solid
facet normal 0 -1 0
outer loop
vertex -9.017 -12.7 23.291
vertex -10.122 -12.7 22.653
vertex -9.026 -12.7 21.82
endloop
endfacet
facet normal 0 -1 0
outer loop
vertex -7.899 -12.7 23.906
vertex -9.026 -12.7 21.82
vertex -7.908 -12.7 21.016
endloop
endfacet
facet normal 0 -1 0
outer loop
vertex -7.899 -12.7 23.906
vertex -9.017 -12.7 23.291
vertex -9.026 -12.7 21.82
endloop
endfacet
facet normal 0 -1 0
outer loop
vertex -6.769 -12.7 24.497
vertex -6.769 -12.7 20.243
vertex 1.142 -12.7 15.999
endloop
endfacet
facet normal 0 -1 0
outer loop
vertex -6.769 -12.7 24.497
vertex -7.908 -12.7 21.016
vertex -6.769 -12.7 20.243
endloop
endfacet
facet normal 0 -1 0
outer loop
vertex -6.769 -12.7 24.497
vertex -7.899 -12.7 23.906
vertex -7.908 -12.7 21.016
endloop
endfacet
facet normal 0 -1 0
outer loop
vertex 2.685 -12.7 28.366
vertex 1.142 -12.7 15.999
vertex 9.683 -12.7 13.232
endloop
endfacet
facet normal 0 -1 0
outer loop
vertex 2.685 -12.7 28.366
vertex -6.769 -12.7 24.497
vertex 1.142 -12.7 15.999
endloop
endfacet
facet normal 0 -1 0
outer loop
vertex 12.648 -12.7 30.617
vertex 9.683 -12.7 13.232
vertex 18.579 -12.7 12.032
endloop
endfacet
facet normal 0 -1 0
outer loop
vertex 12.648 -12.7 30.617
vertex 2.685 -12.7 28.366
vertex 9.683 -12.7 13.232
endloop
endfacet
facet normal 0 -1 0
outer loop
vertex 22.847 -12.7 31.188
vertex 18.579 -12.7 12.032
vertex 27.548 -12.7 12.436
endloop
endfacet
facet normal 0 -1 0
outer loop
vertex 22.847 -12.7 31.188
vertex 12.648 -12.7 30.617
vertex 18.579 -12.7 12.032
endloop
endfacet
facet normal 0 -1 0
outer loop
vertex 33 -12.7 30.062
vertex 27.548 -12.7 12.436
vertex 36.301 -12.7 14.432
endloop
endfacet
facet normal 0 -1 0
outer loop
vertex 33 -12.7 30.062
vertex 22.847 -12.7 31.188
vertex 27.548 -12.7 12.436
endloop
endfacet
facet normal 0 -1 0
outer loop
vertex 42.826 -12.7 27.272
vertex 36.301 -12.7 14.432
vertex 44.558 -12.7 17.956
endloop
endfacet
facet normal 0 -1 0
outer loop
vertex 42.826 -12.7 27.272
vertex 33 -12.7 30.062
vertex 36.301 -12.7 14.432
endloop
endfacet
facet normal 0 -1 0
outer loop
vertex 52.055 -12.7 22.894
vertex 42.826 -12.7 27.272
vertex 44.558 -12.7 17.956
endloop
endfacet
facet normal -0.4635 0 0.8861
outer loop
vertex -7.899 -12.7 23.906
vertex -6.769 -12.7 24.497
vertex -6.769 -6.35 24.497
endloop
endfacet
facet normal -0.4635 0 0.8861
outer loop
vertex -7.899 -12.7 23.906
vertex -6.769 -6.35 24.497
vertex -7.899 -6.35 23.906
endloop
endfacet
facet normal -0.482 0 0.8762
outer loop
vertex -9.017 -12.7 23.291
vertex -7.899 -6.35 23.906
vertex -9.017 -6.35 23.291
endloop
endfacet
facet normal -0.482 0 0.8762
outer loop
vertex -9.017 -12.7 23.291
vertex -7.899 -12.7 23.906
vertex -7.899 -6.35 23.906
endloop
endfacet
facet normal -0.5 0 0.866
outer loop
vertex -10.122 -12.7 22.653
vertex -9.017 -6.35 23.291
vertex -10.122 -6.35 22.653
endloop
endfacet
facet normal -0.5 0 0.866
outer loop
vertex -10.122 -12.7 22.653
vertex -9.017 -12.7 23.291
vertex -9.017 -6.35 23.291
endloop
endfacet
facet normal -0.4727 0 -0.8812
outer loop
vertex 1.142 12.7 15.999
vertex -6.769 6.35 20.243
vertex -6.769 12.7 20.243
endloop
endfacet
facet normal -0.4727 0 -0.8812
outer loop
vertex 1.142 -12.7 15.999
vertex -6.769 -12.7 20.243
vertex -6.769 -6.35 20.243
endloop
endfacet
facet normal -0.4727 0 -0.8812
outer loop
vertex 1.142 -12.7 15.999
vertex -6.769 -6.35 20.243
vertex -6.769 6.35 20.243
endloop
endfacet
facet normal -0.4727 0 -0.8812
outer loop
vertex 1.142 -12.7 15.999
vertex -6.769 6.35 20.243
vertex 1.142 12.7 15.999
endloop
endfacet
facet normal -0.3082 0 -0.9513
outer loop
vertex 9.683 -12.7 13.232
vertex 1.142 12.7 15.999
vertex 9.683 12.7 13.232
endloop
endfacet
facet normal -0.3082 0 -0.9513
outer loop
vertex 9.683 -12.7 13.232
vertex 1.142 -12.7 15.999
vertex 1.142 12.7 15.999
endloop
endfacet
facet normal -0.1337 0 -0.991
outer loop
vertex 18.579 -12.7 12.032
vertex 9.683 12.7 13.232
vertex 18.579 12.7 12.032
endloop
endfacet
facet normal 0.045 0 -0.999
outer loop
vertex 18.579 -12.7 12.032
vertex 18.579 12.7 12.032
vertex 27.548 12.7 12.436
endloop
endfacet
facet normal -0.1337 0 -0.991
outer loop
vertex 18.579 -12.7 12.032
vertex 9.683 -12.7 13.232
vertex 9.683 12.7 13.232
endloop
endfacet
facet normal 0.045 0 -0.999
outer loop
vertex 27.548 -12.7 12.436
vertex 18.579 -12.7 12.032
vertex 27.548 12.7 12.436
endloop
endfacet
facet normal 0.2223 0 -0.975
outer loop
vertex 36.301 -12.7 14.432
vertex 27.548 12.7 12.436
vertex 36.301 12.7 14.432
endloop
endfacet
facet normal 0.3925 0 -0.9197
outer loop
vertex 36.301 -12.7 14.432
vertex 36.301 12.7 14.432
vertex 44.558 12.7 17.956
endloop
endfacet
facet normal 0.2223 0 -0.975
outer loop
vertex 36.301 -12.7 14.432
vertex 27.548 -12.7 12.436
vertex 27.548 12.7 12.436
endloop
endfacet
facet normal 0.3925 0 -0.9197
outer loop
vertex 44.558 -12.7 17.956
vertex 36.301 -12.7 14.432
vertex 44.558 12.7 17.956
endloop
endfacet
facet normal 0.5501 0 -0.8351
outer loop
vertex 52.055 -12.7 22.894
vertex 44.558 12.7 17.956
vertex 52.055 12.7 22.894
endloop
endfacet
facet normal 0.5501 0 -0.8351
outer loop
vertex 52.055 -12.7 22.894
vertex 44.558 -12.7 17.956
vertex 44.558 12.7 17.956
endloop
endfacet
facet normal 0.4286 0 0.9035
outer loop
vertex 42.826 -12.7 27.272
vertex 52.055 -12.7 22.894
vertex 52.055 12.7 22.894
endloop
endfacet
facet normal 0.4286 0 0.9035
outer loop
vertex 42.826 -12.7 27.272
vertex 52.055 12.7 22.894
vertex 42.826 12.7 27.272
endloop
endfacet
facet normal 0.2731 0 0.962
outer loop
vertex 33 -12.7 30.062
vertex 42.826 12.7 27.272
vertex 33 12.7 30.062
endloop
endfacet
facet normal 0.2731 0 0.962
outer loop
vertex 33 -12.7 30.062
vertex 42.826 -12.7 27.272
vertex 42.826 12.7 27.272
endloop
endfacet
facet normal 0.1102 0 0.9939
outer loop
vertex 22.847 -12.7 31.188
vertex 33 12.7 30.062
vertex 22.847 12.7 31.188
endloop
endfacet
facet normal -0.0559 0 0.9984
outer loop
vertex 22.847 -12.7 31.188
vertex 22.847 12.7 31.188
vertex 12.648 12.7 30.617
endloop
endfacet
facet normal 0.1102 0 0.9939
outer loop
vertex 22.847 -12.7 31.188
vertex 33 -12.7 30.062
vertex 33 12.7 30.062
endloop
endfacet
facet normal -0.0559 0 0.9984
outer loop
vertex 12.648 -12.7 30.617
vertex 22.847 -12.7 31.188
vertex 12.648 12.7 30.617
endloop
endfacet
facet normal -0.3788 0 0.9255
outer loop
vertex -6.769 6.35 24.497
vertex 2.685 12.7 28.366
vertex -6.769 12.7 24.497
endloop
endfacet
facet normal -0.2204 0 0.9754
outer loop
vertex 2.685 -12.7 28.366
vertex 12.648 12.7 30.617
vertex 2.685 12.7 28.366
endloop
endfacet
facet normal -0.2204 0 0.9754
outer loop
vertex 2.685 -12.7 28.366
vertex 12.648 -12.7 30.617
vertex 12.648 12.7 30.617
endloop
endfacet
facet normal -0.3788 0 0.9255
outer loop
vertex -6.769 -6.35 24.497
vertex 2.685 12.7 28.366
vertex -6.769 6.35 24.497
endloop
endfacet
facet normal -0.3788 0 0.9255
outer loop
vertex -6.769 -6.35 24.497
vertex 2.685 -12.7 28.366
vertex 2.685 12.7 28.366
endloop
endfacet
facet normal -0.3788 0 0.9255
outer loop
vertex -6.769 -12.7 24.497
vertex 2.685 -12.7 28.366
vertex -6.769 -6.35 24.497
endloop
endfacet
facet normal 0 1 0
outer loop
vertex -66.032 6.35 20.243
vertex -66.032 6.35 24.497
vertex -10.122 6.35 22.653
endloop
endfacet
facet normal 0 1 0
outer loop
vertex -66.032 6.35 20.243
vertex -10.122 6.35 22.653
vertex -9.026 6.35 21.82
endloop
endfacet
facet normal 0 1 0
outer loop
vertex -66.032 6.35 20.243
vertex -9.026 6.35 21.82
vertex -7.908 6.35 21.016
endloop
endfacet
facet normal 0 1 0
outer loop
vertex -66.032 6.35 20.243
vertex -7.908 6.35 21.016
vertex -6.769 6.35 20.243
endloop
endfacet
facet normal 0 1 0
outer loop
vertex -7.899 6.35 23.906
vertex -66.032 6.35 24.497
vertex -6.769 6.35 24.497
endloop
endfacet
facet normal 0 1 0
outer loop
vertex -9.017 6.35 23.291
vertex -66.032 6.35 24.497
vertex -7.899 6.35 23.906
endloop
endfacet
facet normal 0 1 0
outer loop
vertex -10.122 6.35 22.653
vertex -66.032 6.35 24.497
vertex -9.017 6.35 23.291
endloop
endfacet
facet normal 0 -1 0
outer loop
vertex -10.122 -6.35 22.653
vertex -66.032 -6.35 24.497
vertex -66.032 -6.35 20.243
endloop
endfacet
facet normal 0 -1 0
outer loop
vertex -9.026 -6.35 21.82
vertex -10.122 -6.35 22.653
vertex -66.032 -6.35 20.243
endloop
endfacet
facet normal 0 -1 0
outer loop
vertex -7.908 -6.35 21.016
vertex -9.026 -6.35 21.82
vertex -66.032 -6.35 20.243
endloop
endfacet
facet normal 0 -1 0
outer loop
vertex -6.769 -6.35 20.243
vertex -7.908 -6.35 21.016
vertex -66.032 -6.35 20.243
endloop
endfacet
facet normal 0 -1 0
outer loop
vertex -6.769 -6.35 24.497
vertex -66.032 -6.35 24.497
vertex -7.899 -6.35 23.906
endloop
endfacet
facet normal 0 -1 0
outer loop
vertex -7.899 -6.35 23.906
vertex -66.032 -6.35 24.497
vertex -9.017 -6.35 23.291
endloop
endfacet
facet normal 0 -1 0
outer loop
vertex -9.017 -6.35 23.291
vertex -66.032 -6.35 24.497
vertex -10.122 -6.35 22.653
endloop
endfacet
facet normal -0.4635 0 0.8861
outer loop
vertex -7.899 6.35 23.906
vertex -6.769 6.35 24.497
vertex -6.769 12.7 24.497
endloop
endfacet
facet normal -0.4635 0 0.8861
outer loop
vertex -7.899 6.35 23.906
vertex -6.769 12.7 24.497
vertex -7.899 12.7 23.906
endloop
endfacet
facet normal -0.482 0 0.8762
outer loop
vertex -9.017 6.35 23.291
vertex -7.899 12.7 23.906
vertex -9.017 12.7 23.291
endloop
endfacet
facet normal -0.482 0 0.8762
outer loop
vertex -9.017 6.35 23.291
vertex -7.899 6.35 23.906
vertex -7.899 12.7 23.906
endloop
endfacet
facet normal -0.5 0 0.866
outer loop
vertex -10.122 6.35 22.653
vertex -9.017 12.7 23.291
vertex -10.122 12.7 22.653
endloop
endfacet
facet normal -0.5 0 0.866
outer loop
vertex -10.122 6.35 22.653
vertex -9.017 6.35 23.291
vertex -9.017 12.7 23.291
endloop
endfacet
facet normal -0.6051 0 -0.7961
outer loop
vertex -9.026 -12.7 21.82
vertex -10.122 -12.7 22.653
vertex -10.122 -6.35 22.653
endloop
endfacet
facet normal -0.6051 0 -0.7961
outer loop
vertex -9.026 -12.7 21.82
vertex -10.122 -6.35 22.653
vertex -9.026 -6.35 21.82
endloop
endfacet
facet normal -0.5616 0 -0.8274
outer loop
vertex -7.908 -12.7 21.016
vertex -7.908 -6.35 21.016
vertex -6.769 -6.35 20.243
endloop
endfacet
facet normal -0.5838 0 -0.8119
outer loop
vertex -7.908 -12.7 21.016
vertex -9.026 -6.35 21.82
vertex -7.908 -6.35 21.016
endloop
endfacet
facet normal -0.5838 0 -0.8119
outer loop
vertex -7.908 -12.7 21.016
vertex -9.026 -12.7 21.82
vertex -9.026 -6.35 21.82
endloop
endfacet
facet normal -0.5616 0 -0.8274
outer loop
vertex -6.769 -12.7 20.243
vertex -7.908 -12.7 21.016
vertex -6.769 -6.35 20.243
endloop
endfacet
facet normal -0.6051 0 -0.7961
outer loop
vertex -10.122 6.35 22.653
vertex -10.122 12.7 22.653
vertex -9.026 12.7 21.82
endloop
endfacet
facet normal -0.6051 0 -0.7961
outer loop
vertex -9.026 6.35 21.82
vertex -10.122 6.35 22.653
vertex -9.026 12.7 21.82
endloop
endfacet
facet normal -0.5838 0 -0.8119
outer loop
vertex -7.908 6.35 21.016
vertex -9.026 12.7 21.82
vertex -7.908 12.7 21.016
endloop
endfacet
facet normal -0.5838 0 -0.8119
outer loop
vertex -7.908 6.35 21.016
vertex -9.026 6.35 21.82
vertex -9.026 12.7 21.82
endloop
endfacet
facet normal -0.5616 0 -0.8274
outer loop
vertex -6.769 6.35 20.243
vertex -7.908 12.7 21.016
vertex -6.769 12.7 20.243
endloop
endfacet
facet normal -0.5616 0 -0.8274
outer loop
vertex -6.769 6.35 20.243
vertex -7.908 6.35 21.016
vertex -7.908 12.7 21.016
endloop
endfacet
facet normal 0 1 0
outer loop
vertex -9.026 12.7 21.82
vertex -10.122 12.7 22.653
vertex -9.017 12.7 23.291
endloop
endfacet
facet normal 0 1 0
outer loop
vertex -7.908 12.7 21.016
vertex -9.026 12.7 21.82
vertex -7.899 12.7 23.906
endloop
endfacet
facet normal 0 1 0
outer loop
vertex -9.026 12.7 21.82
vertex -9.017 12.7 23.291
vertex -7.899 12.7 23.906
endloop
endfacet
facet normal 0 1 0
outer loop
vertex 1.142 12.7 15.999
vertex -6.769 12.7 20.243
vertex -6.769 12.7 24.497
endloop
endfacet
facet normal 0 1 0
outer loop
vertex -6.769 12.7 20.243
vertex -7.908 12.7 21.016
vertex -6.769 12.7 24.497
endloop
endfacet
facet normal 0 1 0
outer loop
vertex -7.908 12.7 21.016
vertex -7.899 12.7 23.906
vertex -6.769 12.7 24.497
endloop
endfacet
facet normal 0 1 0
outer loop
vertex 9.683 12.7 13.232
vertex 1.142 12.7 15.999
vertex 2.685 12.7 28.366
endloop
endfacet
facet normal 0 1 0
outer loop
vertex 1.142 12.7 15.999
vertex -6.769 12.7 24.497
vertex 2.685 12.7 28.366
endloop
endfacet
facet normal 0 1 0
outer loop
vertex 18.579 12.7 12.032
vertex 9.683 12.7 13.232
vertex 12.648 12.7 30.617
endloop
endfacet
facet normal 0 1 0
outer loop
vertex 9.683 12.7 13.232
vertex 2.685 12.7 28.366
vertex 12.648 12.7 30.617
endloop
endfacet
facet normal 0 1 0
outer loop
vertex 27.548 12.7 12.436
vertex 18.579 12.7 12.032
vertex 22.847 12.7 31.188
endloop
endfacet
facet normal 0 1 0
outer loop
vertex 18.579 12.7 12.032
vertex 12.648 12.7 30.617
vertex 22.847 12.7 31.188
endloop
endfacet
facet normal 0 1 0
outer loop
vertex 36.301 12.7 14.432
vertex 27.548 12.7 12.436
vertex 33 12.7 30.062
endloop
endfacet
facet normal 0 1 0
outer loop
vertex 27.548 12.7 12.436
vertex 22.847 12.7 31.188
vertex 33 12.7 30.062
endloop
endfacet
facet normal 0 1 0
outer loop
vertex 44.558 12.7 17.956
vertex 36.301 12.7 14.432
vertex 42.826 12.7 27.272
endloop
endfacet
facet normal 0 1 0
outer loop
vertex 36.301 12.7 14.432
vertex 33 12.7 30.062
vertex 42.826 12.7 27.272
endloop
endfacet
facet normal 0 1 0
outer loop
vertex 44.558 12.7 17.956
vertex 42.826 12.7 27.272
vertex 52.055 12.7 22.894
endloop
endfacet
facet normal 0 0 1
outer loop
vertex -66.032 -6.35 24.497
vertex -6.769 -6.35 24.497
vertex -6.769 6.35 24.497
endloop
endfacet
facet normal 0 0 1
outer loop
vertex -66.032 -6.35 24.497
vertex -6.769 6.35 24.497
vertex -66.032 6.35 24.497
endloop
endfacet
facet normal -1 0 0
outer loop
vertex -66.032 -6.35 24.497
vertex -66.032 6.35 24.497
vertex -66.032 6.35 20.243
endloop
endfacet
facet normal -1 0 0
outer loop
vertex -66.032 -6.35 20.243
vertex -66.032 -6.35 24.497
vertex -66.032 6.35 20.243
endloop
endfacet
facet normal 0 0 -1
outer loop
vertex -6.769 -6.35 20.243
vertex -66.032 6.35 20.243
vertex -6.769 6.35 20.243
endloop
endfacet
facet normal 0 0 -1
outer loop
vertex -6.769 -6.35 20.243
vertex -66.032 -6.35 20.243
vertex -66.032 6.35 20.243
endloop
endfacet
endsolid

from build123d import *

# Parameters (mm, degrees)
F1_DEPTH = 12.7
F2_DEPTH = 6.35


with BuildPart() as f1:
    # F0 (on Front) → F1 (new body, symmetric)
    with BuildSketch(Plane.XZ):
        with BuildLine():
            ThreePointArc((-6.7687, 20.243496), (23.072752, 12.032943), (52.054703, 22.894429))
            ThreePointArc((52.054703, 22.894429), (22.847112, 31.187553), (-6.7687, 24.497039))
            ThreePointArc((-6.7687, 24.497039), (-8.459565, 23.601319), (-10.121748, 22.653433))
            ThreePointArc((-10.121748, 22.653433), (-8.470025, 21.413957), (-6.7687, 20.243496))
        make_face()
    extrude(amount=F1_DEPTH, both=True)

    # F0 (on Front) → F2 (join, symmetric)
    with BuildSketch(Plane.XZ):
        with BuildLine():
            ThreePointArc((-10.121748, 22.653433), (-8.459565, 23.601319), (-6.7687, 24.497039))
            Line((-6.7687, 24.497039), (-66.03235, 24.497039))
            Line((-66.03235, 24.497039), (-66.03235, 20.243496))
            Line((-66.03235, 20.243496), (-6.7687, 20.243496))
            ThreePointArc((-6.7687, 20.243496), (-8.470025, 21.413957), (-10.121748, 22.653433))
        make_face()
    extrude(amount=F2_DEPTH, both=True)


solid = f1.part
